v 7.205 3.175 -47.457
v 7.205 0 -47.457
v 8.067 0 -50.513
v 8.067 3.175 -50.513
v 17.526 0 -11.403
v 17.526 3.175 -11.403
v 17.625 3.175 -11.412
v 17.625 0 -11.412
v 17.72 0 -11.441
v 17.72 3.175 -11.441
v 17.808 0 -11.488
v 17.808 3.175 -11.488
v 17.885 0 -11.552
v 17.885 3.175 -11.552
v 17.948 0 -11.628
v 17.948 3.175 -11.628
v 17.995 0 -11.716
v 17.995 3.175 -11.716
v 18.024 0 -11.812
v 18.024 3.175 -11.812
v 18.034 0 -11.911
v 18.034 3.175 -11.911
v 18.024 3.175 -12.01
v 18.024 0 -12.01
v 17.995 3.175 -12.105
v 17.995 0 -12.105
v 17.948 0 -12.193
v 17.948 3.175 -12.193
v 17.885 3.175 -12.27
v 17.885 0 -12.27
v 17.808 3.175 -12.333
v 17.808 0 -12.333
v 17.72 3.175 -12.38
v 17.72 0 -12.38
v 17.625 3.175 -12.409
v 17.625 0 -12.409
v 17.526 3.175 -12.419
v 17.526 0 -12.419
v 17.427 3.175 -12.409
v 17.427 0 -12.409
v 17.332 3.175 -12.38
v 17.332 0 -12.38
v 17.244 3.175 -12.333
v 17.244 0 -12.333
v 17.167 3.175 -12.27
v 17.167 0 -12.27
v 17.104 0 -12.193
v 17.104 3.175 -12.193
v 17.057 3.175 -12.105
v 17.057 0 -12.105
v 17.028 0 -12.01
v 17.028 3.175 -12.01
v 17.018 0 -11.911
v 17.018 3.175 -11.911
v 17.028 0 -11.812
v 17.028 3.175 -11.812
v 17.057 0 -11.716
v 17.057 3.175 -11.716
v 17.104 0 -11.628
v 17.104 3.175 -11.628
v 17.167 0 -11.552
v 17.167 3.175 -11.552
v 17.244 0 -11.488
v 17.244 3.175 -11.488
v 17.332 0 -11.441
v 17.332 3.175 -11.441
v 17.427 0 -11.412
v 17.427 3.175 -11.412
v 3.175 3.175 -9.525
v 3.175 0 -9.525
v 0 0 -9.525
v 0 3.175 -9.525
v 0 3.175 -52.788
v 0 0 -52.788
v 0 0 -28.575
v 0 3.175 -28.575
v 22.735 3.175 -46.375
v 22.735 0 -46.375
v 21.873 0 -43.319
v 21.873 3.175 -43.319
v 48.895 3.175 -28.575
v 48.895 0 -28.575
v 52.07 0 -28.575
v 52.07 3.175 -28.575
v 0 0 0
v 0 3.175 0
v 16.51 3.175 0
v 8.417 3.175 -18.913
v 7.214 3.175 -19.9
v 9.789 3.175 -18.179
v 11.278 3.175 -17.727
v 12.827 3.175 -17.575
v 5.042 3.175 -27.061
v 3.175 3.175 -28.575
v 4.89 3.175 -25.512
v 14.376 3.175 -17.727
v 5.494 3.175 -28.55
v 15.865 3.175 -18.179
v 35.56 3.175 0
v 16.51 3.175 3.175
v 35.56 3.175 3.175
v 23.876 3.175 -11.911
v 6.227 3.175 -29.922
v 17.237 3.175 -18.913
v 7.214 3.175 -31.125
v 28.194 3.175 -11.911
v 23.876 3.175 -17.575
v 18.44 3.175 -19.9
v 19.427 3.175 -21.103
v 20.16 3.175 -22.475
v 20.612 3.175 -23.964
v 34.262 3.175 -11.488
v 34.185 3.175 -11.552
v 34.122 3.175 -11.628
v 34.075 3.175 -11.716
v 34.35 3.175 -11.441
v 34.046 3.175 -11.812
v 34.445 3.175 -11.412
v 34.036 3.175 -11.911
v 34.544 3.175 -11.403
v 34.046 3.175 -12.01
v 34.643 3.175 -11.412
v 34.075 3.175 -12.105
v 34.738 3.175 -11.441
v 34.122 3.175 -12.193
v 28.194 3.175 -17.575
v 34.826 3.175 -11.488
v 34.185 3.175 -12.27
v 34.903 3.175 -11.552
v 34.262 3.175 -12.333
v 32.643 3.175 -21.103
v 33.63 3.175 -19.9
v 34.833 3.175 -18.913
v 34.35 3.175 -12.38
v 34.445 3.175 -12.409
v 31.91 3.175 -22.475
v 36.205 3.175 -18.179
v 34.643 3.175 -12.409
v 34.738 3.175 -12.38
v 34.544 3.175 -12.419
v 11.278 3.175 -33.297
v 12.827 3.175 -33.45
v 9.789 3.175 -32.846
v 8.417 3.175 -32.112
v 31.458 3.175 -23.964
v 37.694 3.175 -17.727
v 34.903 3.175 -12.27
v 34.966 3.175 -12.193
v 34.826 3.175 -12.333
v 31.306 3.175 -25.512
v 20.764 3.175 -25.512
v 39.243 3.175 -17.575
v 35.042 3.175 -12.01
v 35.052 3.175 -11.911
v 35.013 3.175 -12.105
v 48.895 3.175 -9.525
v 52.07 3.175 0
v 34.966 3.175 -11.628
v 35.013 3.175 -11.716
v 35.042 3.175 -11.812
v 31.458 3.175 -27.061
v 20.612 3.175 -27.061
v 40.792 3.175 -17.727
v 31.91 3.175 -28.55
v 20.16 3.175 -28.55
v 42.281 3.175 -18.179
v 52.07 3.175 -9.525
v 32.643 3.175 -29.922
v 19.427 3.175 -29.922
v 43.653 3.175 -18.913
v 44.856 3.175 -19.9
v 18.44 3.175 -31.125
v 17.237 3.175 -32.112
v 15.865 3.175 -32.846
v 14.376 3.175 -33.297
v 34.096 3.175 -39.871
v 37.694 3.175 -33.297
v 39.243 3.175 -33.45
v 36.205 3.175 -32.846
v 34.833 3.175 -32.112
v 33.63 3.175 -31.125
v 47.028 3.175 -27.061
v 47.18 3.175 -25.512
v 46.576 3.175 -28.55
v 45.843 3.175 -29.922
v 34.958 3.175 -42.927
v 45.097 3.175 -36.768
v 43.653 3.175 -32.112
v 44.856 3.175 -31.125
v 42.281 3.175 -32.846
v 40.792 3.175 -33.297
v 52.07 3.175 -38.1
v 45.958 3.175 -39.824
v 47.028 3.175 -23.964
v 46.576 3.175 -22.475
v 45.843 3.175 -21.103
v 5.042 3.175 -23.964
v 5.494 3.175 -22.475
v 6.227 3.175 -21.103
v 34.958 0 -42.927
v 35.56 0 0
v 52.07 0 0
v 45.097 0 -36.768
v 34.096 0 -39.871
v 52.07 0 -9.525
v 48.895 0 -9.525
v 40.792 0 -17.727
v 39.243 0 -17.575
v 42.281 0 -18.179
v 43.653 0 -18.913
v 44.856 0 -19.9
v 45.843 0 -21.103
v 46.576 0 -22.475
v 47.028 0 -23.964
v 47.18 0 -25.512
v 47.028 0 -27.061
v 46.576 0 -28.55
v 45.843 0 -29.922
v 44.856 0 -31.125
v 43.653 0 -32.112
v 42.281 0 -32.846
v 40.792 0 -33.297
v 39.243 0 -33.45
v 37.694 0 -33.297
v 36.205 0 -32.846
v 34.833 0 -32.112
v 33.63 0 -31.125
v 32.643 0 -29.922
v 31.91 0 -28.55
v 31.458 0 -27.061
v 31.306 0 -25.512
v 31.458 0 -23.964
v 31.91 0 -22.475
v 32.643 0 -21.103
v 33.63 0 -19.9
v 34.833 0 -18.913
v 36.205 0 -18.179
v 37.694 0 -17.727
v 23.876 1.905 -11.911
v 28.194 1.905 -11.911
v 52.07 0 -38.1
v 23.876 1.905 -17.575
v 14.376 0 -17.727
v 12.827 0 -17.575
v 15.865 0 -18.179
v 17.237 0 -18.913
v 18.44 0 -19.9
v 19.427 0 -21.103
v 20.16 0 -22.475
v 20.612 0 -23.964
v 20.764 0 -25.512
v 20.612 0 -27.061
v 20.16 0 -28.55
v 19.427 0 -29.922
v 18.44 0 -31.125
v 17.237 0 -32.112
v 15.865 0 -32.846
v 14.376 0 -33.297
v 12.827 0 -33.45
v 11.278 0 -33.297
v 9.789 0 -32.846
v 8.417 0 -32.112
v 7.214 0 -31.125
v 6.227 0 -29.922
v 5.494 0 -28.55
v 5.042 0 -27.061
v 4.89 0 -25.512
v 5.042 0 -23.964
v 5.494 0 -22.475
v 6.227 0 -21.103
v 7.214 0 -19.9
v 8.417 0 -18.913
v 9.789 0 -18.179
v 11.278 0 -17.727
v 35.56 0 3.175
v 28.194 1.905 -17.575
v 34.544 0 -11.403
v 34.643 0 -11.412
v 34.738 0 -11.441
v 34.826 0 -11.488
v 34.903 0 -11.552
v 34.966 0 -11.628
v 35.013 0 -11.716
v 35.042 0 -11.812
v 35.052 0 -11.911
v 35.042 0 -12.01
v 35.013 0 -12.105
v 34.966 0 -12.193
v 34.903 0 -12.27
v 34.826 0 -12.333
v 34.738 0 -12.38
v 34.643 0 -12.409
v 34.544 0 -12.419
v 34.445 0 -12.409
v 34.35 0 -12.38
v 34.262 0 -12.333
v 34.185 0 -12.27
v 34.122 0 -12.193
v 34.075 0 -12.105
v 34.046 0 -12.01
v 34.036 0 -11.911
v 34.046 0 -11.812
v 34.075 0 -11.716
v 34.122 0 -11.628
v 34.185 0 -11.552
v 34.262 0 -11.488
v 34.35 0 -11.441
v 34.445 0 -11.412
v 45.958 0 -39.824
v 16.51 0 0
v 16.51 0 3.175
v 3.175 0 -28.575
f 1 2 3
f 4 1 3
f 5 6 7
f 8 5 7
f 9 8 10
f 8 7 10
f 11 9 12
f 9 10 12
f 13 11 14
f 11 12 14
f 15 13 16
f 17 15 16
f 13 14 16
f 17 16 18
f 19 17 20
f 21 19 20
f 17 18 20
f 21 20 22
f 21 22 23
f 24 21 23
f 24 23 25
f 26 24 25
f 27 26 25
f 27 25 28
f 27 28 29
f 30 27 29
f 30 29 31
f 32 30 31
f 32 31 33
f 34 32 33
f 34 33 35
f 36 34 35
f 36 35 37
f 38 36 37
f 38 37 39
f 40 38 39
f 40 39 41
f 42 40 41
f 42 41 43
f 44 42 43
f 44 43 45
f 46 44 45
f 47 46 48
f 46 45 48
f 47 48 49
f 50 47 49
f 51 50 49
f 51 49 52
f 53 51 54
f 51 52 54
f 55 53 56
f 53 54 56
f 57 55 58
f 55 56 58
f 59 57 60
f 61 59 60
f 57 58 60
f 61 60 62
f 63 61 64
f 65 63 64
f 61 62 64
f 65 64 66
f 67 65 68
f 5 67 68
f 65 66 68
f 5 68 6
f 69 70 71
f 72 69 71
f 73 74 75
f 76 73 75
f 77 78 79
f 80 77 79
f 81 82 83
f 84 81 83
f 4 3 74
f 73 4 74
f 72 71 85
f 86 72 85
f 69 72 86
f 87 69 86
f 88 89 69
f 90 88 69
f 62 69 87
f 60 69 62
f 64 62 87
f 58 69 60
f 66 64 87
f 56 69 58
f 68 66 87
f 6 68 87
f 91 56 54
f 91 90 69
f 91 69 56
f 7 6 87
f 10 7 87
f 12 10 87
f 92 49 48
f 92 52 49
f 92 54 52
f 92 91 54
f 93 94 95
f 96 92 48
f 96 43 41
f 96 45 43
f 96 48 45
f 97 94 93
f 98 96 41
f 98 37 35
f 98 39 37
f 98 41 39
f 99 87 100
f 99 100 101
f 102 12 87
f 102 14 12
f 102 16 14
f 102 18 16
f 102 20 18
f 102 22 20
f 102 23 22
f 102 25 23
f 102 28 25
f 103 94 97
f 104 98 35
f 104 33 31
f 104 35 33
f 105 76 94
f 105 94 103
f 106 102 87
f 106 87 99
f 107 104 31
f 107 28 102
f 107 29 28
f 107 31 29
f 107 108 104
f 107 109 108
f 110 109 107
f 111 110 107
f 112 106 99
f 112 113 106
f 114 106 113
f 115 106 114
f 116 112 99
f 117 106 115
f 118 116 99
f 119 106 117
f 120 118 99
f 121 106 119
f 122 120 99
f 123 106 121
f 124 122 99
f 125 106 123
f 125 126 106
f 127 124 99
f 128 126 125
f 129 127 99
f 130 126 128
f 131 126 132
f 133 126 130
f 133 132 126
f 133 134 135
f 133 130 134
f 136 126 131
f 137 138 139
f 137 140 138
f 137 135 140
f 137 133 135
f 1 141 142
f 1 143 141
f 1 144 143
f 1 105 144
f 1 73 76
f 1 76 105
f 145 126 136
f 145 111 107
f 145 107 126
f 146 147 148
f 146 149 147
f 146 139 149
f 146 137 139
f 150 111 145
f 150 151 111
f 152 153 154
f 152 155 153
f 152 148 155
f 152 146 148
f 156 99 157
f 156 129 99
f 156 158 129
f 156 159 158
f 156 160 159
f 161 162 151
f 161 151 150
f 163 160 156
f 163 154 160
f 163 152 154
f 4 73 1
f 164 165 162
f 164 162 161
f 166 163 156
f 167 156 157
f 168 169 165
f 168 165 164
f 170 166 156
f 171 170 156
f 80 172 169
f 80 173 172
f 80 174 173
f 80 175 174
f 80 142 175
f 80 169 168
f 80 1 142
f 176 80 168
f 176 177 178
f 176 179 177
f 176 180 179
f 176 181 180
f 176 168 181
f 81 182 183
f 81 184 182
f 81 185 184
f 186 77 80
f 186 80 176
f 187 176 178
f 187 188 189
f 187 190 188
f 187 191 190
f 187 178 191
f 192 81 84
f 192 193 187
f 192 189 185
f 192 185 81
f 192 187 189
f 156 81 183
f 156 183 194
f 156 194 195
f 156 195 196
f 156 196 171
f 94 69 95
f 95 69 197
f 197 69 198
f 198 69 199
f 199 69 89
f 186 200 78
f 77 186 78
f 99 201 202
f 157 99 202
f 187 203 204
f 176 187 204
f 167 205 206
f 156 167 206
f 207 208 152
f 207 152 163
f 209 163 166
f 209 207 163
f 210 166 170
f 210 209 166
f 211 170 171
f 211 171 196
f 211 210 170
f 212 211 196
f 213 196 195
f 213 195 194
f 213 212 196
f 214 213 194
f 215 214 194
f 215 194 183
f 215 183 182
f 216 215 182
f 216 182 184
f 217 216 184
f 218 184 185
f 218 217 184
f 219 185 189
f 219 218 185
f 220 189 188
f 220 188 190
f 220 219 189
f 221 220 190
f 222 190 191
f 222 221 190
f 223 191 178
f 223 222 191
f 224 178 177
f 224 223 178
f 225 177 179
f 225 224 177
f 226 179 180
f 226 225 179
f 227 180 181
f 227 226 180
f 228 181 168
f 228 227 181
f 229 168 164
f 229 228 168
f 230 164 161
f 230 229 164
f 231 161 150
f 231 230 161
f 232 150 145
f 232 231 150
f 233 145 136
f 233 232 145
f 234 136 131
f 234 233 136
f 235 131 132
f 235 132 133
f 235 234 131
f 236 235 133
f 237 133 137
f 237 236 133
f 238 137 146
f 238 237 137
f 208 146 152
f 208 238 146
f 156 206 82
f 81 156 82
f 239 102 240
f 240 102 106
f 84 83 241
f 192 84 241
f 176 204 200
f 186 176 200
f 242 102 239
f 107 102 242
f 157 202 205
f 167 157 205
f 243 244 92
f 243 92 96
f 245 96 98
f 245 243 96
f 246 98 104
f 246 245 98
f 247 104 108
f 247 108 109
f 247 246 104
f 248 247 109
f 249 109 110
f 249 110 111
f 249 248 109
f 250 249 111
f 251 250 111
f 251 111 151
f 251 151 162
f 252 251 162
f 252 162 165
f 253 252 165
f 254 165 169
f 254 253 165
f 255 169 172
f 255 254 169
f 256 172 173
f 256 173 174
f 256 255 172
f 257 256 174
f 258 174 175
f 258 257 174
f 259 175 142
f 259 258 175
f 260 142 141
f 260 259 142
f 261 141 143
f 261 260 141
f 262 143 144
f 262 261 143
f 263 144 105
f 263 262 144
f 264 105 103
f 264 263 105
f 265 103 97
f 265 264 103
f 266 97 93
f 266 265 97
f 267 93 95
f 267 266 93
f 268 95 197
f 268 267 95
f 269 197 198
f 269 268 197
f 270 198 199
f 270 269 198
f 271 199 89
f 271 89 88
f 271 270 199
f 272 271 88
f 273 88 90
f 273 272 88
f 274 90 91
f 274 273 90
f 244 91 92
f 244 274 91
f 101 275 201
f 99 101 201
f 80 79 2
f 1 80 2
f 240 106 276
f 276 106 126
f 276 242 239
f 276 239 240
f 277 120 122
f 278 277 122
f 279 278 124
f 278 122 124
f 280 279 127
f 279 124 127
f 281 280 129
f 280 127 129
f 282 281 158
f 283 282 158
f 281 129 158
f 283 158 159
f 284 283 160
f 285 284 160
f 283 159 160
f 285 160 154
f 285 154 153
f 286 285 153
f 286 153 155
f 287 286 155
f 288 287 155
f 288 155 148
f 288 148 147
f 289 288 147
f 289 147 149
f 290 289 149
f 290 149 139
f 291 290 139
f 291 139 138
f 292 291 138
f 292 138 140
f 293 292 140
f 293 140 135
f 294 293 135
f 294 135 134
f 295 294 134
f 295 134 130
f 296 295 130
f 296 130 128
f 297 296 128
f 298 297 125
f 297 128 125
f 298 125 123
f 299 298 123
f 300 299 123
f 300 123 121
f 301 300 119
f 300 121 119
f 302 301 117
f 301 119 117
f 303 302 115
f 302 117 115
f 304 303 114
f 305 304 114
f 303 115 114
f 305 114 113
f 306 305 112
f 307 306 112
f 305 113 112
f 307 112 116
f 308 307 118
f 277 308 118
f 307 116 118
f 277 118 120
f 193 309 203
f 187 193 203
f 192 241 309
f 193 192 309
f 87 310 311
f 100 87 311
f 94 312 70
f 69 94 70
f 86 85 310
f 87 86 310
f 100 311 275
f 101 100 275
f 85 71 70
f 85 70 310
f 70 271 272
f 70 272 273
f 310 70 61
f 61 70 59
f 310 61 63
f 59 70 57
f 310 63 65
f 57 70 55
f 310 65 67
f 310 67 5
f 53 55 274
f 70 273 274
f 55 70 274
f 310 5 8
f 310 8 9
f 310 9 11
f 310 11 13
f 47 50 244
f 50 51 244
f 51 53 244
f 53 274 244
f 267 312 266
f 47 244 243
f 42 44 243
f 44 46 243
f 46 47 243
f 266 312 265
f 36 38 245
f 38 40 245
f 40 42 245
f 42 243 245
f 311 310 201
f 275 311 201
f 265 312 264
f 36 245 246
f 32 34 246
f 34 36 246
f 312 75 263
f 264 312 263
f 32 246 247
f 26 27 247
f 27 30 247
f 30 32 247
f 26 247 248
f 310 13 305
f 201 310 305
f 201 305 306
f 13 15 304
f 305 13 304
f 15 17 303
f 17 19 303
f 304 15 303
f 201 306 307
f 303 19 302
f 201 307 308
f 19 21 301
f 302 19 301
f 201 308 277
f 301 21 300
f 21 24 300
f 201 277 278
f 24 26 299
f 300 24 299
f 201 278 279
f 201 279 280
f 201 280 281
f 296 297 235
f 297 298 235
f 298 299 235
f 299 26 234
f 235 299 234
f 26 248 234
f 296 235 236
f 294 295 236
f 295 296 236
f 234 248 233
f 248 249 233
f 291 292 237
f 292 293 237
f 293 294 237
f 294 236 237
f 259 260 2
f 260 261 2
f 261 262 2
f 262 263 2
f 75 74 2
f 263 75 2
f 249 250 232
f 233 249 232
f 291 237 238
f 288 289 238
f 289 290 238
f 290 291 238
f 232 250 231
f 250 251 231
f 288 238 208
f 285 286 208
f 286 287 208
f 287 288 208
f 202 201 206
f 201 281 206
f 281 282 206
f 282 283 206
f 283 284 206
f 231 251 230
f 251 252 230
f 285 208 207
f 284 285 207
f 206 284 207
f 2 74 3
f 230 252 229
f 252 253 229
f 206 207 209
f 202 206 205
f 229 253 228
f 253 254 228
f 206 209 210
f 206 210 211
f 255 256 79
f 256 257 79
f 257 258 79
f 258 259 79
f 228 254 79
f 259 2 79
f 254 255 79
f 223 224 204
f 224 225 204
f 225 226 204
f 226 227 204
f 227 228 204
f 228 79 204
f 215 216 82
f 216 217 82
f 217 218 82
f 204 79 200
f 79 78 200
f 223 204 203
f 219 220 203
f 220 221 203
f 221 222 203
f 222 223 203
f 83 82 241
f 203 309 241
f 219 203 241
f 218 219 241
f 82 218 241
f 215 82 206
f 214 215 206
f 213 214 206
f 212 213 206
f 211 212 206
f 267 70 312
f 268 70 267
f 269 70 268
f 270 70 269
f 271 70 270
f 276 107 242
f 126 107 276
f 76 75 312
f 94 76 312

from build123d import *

# Parameters (mm, degrees)
SKETCH1_R           = 7.9375
BOSS_EXTRUDE1_DEPTH = 3.175
SKETCH2_W           = 4.318
SKETCH2_H           = 5.6642
CUT_EXTRUDE1_DEPTH  = 1.27
SKETCH3_R           = 0.508
CUT_EXTRUDE2_DEPTH  = 75.215587445


with BuildPart() as part:
    # Sketch1 → Boss-Extrude1 (new body)
    with BuildSketch(Plane(origin=(0, 0, 0), x_dir=(1, 0, 0), z_dir=(0, 1, 0))):
        Polygon((0, 0), (16.51, 0), (16.51, -3.175), (35.56, -3.175), (35.56, 0), (52.07, 0), (52.07, 9.525), (48.895, 9.525), (48.895, 28.575), (52.07, 28.575), (52.07, 38.1), (45.958497653, 39.823960283), (45.096517511, 36.768209109), (34.095813286, 39.871337619), (34.957793427, 42.927088793), (22.734788732, 46.375009359), (21.872808591, 43.319258185), (7.205202957, 47.456762864), (8.067183099, 50.512514038), (0, 52.788141612), (0, 28.575), (3.175, 28.575), (3.175, 9.525), (0, 9.525), align=None)
        with Locations(Location((12.827, 25.512426191, 0), (0, 0, 270))):
            Circle(SKETCH1_R, mode=Mode.SUBTRACT)
        with Locations(Location((39.243, 25.512426191, 0), (0, 0, 270))):
            Circle(SKETCH1_R, mode=Mode.SUBTRACT)
    extrude(amount=BOSS_EXTRUDE1_DEPTH)

    # Sketch2 → Cut-Extrude1 (cut)
    with BuildSketch(Plane(origin=(0, 3.175, 0), x_dir=(1, 0, 0), z_dir=(0, 1, 0))):
        with Locations((26.035, 14.742826191)):
            Rectangle(SKETCH2_W, SKETCH2_H)
    extrude(amount=-CUT_EXTRUDE1_DEPTH, mode=Mode.SUBTRACT)

    # Sketch3 → Cut-Extrude2 (cut, through all)
    with BuildSketch(Plane(origin=(0, 3.175, 0), x_dir=(1, 0, 0), z_dir=(0, 1, 0))):
        with Locations(Location((17.526, 11.910726191, 0), (0, 0, 270))):
            Circle(SKETCH3_R)
        with Locations(Location((34.544, 11.910726191, 0), (0, 0, 270))):
            Circle(SKETCH3_R)
    extrude(amount=-CUT_EXTRUDE2_DEPTH, mode=Mode.SUBTRACT)


solid = part.part
